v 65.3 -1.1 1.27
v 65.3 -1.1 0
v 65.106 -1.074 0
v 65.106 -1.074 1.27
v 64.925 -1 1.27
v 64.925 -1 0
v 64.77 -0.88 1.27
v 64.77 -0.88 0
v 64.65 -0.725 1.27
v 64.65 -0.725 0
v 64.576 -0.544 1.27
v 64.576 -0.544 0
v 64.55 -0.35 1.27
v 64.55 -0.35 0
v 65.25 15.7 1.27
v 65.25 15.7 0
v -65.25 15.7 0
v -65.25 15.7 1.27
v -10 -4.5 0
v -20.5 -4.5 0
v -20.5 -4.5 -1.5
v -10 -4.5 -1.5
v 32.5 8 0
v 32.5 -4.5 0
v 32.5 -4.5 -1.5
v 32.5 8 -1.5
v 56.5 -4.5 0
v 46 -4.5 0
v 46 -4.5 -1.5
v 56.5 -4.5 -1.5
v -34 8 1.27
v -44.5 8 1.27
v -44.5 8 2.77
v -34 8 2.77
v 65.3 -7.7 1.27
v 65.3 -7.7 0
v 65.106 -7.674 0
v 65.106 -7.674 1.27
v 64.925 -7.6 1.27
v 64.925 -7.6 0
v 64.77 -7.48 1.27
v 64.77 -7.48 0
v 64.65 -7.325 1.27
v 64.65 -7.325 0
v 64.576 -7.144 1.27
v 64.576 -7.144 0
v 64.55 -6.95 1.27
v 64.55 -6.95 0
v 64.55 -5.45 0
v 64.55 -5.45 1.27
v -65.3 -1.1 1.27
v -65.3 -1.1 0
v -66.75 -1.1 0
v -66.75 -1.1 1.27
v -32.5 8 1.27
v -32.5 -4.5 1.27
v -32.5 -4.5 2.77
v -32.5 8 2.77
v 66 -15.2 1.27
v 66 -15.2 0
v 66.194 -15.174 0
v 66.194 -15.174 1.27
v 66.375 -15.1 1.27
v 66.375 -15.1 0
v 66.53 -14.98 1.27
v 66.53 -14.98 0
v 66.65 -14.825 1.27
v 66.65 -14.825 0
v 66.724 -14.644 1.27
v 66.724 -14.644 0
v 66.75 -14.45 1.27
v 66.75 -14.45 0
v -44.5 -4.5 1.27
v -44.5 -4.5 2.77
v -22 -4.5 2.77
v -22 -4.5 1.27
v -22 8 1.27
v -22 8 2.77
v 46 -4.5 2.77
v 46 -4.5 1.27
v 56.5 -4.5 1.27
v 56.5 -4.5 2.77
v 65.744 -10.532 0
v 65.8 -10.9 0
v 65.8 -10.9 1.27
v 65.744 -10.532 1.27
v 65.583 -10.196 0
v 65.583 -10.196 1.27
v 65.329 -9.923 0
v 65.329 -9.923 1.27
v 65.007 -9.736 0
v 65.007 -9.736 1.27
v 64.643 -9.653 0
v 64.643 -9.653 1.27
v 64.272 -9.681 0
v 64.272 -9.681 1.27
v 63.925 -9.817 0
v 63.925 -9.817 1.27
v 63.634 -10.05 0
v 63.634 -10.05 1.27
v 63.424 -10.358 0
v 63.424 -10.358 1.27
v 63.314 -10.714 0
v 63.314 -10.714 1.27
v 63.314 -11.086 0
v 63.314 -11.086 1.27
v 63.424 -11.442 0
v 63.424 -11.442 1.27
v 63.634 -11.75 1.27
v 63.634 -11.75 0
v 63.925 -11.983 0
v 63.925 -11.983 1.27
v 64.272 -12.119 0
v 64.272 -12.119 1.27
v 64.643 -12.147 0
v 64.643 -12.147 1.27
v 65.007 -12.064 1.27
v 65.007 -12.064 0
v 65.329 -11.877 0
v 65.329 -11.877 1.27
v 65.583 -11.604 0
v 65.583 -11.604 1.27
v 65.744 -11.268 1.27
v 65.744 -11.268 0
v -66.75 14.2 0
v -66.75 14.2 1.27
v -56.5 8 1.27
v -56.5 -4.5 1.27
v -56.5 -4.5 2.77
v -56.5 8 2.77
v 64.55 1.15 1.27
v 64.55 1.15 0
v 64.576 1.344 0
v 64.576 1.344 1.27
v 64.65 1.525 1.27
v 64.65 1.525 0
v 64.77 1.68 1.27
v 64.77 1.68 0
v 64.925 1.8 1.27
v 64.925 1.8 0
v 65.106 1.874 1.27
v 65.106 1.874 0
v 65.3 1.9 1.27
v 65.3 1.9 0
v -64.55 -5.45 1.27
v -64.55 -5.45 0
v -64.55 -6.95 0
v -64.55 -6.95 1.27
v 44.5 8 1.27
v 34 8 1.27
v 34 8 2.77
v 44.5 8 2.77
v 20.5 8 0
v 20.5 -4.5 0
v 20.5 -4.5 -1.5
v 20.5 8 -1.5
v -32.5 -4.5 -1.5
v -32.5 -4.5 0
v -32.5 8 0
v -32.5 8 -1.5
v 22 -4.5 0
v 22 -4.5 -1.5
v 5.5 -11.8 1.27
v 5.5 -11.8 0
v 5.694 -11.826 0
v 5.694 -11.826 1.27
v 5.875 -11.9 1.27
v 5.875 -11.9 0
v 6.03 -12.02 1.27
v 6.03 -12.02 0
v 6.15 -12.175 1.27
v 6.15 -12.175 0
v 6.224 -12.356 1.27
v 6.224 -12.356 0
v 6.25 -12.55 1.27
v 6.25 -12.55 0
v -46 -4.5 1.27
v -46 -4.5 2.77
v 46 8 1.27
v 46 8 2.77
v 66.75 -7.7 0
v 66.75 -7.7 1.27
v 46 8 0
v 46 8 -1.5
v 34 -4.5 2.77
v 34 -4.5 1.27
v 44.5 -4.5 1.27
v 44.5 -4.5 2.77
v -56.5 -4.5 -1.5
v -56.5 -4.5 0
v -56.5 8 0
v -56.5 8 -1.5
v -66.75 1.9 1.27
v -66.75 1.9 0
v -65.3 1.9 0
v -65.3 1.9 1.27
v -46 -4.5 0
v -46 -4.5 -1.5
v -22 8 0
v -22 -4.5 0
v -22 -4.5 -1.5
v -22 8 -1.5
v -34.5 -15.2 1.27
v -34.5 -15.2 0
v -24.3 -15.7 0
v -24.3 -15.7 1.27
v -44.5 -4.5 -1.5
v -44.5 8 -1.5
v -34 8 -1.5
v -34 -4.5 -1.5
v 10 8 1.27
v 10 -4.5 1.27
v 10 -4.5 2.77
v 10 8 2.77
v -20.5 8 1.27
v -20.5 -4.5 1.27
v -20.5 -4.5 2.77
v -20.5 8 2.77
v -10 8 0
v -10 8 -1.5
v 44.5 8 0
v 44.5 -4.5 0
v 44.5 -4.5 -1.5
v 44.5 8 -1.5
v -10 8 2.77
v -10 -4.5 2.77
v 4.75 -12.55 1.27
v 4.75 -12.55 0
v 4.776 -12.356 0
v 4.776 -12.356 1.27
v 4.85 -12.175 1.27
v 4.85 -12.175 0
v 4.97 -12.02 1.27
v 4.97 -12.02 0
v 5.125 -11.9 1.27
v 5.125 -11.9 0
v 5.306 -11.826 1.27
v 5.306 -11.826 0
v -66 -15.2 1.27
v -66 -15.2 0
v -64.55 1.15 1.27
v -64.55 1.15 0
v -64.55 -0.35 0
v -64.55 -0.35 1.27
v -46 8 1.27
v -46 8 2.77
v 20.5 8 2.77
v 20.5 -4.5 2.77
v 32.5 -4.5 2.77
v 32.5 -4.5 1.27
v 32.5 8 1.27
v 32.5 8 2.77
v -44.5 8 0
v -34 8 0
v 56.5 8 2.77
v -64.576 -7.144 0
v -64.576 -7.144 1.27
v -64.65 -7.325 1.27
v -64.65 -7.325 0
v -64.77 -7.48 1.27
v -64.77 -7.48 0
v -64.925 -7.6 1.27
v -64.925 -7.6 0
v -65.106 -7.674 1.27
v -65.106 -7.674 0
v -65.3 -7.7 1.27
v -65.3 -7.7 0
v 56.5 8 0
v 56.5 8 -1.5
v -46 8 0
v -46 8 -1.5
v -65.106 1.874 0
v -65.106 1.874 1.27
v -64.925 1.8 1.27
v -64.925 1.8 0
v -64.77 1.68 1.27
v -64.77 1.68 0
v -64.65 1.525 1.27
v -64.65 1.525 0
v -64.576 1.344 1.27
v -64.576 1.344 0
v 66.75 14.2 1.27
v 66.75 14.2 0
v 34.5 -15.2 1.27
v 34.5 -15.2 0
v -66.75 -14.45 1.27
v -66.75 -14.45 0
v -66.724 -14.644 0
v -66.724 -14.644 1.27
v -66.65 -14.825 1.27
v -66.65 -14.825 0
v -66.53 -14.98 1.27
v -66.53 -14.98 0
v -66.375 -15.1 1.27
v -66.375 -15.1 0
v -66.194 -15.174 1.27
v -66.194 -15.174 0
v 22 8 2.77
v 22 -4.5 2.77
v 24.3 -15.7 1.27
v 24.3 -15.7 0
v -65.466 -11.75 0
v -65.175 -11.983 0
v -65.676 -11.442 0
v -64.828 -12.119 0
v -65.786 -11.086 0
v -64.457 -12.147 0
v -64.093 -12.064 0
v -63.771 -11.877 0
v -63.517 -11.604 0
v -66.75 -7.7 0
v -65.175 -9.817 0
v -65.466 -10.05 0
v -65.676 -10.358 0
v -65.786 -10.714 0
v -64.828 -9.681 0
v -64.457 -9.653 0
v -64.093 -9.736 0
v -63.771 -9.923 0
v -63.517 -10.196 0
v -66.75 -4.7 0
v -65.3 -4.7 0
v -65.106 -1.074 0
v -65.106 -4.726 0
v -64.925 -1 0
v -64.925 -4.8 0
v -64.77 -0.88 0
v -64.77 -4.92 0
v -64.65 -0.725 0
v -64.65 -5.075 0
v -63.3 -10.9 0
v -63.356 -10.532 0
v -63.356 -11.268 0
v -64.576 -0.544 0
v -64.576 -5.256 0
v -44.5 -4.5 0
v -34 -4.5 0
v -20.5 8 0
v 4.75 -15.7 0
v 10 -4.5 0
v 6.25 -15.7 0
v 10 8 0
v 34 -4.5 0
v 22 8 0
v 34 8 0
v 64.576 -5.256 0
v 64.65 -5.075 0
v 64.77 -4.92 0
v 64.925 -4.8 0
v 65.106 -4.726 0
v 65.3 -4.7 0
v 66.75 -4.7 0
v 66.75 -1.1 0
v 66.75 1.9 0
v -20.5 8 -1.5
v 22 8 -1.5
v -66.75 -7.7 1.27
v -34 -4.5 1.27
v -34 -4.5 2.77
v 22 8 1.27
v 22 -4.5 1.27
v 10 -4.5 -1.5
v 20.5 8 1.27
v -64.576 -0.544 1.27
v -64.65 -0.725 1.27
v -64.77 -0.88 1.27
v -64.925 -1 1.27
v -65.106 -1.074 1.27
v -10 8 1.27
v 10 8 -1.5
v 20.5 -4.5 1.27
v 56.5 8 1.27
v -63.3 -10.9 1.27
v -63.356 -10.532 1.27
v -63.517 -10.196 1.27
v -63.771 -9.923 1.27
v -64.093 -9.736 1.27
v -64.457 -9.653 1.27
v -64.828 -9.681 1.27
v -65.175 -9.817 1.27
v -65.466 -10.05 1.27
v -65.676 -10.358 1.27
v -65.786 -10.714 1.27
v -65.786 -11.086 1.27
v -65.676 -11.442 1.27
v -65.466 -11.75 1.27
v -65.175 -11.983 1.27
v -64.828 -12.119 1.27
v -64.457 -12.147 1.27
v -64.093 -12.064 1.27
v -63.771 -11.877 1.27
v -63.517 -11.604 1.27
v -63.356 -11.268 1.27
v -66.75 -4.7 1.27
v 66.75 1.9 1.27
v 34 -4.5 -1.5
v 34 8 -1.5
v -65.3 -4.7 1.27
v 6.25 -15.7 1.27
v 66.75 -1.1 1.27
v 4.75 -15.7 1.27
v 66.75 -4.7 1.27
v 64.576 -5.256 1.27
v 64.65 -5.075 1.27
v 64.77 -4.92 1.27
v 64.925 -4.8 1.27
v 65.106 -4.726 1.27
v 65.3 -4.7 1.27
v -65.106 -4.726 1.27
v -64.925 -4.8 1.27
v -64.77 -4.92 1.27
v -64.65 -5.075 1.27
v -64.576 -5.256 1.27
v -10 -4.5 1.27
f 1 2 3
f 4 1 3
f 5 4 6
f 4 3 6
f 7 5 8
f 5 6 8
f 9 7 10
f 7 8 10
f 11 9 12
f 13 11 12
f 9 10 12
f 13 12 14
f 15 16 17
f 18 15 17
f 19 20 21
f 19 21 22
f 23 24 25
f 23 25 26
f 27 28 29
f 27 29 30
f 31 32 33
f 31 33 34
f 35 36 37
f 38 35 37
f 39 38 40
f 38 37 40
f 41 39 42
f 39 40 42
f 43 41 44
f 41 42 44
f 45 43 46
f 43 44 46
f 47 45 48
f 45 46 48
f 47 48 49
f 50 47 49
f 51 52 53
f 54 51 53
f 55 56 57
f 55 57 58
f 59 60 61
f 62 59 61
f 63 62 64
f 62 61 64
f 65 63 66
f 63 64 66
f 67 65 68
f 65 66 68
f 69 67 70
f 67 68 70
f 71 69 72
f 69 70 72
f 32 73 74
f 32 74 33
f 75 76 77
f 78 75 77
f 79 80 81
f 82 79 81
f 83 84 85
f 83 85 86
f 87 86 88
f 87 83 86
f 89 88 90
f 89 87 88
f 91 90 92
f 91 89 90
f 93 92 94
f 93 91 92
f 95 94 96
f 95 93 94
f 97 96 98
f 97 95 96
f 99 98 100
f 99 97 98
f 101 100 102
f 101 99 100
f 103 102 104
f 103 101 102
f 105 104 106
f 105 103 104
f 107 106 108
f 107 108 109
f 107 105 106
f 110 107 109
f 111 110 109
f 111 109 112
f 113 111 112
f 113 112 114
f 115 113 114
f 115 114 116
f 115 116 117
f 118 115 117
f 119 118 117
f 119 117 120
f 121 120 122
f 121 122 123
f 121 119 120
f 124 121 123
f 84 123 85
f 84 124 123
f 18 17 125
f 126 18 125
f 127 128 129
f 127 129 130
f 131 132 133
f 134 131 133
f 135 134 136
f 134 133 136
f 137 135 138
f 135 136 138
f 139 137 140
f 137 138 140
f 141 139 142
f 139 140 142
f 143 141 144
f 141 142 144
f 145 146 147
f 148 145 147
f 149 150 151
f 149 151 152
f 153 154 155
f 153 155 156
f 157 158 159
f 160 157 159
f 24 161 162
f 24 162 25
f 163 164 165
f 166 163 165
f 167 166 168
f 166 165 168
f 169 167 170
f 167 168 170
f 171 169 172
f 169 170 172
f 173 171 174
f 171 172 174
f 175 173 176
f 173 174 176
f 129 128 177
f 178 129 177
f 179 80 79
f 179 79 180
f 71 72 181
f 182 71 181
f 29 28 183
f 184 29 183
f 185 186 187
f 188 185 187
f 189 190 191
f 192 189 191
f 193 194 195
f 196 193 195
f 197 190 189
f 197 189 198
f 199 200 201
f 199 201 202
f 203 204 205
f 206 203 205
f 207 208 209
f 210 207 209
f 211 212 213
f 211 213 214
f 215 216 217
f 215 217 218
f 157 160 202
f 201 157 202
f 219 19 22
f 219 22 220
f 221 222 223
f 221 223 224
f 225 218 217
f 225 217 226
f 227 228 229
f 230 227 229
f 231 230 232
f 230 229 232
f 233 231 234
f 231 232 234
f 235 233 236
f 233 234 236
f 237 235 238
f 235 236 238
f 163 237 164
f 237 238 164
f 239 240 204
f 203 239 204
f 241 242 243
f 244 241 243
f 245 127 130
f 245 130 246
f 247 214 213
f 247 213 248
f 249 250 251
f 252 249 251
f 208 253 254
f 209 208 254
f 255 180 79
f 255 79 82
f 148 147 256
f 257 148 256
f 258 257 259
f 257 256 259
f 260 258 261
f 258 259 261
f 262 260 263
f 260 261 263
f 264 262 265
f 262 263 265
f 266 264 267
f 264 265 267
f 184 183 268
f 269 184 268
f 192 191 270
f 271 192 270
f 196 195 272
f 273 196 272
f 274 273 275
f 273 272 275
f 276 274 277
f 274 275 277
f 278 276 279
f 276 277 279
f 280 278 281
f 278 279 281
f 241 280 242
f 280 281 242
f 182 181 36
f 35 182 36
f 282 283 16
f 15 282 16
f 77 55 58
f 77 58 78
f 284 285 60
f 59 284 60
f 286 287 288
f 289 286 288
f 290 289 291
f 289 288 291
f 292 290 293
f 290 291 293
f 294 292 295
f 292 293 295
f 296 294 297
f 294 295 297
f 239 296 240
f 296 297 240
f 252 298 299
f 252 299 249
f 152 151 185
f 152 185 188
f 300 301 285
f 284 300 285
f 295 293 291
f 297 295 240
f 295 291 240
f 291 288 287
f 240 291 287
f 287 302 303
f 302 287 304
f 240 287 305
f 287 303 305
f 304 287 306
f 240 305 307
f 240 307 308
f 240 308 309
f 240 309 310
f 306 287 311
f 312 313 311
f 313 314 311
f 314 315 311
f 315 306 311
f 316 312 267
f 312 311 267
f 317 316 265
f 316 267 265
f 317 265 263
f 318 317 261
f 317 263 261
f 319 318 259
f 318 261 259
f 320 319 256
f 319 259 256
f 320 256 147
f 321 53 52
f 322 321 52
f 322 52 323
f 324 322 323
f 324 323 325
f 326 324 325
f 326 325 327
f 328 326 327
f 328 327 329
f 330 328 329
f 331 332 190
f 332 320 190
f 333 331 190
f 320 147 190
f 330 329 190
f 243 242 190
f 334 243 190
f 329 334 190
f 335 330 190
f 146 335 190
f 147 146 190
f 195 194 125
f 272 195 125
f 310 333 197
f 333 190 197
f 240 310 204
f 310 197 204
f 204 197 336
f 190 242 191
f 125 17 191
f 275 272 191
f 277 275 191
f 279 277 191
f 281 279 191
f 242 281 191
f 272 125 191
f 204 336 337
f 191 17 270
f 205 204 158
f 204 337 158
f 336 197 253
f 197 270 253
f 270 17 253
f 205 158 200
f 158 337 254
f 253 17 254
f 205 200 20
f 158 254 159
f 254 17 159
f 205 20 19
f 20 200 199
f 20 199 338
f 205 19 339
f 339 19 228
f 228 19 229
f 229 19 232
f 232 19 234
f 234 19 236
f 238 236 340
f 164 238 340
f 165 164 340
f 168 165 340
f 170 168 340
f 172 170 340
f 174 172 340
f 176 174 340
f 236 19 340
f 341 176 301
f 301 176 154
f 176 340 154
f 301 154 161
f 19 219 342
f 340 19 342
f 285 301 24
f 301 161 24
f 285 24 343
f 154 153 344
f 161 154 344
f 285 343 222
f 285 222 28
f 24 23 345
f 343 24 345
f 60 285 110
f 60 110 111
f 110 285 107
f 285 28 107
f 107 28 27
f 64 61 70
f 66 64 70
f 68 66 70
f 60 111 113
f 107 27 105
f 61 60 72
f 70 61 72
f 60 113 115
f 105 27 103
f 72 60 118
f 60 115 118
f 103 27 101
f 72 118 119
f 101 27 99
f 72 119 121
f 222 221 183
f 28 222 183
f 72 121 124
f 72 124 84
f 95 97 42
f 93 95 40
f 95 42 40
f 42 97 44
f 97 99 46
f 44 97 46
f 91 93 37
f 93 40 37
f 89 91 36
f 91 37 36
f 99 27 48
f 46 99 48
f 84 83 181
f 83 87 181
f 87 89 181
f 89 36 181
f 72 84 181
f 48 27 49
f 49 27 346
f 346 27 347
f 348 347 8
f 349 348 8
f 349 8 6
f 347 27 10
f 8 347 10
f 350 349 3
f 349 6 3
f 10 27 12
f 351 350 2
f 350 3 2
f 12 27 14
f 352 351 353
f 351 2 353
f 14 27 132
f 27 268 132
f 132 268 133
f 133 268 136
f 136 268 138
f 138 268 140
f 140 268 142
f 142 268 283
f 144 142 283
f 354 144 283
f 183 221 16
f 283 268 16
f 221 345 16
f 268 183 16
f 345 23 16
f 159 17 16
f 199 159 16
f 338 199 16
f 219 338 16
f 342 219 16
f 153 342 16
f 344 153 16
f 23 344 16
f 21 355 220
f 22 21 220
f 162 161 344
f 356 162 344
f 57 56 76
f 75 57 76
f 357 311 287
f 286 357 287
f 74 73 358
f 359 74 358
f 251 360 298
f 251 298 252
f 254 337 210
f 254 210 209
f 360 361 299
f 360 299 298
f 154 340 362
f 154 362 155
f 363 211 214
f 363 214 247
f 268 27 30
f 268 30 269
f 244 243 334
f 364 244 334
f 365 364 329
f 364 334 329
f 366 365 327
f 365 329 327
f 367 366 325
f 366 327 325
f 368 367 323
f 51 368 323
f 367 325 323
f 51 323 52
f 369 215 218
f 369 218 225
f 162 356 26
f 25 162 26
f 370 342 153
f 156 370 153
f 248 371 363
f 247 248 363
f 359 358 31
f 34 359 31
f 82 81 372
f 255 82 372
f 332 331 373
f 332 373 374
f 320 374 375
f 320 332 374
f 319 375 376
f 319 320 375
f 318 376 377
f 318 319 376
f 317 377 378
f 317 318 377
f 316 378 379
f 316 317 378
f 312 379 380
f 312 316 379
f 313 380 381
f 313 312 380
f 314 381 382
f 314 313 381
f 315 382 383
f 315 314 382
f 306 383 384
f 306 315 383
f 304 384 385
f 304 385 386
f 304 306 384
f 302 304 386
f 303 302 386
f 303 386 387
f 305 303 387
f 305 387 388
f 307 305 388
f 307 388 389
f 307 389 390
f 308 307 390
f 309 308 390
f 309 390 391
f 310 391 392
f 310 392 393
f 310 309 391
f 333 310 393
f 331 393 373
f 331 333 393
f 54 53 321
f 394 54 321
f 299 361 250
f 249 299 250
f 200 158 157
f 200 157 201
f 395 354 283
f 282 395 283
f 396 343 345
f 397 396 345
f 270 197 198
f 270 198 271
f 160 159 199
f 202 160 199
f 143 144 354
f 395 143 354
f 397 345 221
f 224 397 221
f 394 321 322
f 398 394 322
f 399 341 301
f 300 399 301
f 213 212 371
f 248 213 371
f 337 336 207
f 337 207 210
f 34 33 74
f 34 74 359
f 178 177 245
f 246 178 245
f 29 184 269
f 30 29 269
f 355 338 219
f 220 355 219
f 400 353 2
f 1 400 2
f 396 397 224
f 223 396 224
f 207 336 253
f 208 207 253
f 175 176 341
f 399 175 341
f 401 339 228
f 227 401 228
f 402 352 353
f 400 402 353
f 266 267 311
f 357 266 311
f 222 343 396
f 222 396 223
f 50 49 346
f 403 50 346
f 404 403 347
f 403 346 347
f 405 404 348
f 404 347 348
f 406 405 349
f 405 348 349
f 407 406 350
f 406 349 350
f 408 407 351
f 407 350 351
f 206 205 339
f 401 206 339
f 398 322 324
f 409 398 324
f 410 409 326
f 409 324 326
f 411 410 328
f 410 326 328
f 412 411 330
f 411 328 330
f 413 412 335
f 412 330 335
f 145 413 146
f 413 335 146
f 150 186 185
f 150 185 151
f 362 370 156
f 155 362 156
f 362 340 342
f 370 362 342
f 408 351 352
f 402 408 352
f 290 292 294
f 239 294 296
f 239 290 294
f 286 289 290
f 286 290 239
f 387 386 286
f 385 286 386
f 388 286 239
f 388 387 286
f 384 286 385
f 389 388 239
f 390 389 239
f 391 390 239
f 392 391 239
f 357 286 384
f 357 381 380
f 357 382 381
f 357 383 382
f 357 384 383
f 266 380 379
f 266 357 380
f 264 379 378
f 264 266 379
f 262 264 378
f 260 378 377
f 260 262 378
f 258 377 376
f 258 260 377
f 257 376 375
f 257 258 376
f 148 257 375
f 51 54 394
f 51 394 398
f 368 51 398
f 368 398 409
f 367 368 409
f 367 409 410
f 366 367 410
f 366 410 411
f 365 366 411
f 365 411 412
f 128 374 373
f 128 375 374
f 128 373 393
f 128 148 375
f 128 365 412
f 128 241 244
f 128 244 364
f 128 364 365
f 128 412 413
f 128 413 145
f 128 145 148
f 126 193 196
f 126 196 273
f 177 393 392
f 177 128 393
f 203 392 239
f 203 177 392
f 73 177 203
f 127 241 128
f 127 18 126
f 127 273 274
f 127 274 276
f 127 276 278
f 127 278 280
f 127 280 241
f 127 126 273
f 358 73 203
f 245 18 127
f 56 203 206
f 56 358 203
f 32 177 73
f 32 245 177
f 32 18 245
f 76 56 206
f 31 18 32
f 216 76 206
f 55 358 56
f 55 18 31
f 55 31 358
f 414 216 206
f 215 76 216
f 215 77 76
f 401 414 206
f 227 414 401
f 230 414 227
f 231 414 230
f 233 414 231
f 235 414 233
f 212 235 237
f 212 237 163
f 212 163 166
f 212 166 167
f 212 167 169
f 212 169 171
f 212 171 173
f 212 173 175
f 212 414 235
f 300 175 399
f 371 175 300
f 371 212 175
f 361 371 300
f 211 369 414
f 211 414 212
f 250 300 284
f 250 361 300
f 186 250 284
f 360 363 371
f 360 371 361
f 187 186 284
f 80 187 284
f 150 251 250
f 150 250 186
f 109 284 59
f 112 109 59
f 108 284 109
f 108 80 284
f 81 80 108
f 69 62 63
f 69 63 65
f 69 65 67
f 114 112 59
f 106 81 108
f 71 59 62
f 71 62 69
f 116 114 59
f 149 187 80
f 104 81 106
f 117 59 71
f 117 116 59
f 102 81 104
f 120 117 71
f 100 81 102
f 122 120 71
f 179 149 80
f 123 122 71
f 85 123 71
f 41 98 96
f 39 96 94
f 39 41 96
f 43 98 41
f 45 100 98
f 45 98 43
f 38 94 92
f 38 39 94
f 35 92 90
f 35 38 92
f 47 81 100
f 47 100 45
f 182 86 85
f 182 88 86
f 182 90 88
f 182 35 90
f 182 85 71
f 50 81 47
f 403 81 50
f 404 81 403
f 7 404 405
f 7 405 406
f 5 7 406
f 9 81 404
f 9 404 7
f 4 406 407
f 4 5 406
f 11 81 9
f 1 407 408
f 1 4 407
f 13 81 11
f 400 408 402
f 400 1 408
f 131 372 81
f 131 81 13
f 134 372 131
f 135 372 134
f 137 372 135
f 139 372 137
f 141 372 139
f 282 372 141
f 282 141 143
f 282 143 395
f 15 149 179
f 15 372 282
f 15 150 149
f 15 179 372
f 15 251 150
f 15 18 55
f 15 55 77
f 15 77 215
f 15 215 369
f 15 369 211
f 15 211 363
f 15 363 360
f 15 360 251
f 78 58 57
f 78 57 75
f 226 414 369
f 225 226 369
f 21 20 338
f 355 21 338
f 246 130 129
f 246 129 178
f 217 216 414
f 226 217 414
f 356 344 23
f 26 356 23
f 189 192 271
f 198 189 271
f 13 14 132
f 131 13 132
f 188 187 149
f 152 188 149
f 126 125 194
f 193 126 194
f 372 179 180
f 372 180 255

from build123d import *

# Parameters (mm, degrees)
F0_R     = 1.25
F1_DEPTH = 1.27
F2_W     = 10.5
F2_H     = 12.5
F3_DEPTH = 1.5
F4_DEPTH = 2.77


with BuildPart() as f1:
    # F0 (on Top) → F1 (new body)
    with BuildSketch(Plane.XY):
        with BuildLine():
            ThreePointArc((-66.75, -14.45), (-66.53033, -14.98033), (-66, -15.2))
            Line((-66, -15.2), (-34.5, -15.2))
            Line((-34.5, -15.2), (-24.3, -15.7))
            Line((-24.3, -15.7), (4.75, -15.7))
            Line((4.75, -15.7), (4.75, -12.55))
            ThreePointArc((4.75, -12.55), (4.96967, -12.01967), (5.5, -11.8))
            ThreePointArc((5.5, -11.8), (6.03033, -12.01967), (6.25, -12.55))
            Line((6.25, -12.55), (6.25, -15.7))
            Line((6.25, -15.7), (24.3, -15.7))
            Line((24.3, -15.7), (34.5, -15.2))
            Line((34.5, -15.2), (66, -15.2))
            ThreePointArc((66, -15.2), (66.53033, -14.98033), (66.75, -14.45))
            Line((66.75, -14.45), (66.75, -7.7))
            Line((66.75, -7.7), (65.3, -7.7))
            ThreePointArc((65.3, -7.7), (64.76967, -7.48033), (64.55, -6.95))
            Line((64.55, -6.95), (64.55, -5.45))
            ThreePointArc((64.55, -5.45), (64.76967, -4.91967), (65.3, -4.7))
            Line((65.3, -4.7), (66.75, -4.7))
            Line((66.75, -4.7), (66.75, -1.1))
            Line((66.75, -1.1), (65.3, -1.1))
            ThreePointArc((65.3, -1.1), (64.76967, -0.88033), (64.55, -0.35))
            Line((64.55, -0.35), (64.55, 1.15))
            ThreePointArc((64.55, 1.15), (64.76967, 1.68033), (65.3, 1.9))
            Line((65.3, 1.9), (66.75, 1.9))
            Line((66.75, 1.9), (66.75, 14.2))
            Line((66.75, 14.2), (65.25, 15.7))
            Line((65.25, 15.7), (-65.25, 15.7))
            Line((-65.25, 15.7), (-66.75, 14.2))
            Line((-66.75, 14.2), (-66.75, 1.9))
            Line((-66.75, 1.9), (-65.3, 1.9))
            ThreePointArc((-65.3, 1.9), (-64.76967, 1.68033), (-64.55, 1.15))
            Line((-64.55, 1.15), (-64.55, -0.35))
            ThreePointArc((-64.55, -0.35), (-64.76967, -0.88033), (-65.3, -1.1))
            Line((-65.3, -1.1), (-66.75, -1.1))
            Line((-66.75, -1.1), (-66.75, -4.7))
            Line((-66.75, -4.7), (-65.3, -4.7))
            ThreePointArc((-65.3, -4.7), (-64.76967, -4.91967), (-64.55, -5.45))
            Line((-64.55, -5.45), (-64.55, -6.95))
            ThreePointArc((-64.55, -6.95), (-64.76967, -7.48033), (-65.3, -7.7))
            Line((-65.3, -7.7), (-66.75, -7.7))
            Line((-66.75, -7.7), (-66.75, -14.45))
        make_face()
        with Locations((-64.55, -10.9)):
            Circle(F0_R, mode=Mode.SUBTRACT)
        with Locations((64.55, -10.9)):
            Circle(F0_R, mode=Mode.SUBTRACT)
    extrude(amount=F1_DEPTH)

    # F2 (on face) → F3 (join)
    with BuildSketch(Plane.XY.offset(1.27)):
        with Locations((-51.25, 1.75)):
            Rectangle(F2_W, F2_H)
        with Locations((-39.25, 1.75)):
            Rectangle(F2_W, F2_H)
        with Locations((-27.25, 1.75)):
            Rectangle(F2_W, F2_H)
        with Locations((-15.25, 1.75)):
            Rectangle(F2_W, F2_H)
        with Locations((51.25, 1.75)):
            Rectangle(F2_W, F2_H)
        with Locations((39.25, 1.75)):
            Rectangle(F2_W, F2_H)
        with Locations((15.25, 1.75)):
            Rectangle(F2_W, F2_H)
        with Locations((27.25, 1.75)):
            Rectangle(F2_W, F2_H)
    extrude(amount=F3_DEPTH)

    # F2 (on face) → F4 (join)
    with BuildSketch(Plane.XY.offset(1.27)):
        with Locations((-51.25, 1.75)):
            Rectangle(F2_W, F2_H)
        with Locations((-39.25, 1.75)):
            Rectangle(F2_W, F2_H)
        with Locations((-27.25, 1.75)):
            Rectangle(F2_W, F2_H)
        with Locations((-15.25, 1.75)):
            Rectangle(F2_W, F2_H)
        with Locations((51.25, 1.75)):
            Rectangle(F2_W, F2_H)
        with Locations((39.25, 1.75)):
            Rectangle(F2_W, F2_H)
        with Locations((15.25, 1.75)):
            Rectangle(F2_W, F2_H)
        with Locations((27.25, 1.75)):
            Rectangle(F2_W, F2_H)
    extrude(amount=-F4_DEPTH)


solid = f1.part
